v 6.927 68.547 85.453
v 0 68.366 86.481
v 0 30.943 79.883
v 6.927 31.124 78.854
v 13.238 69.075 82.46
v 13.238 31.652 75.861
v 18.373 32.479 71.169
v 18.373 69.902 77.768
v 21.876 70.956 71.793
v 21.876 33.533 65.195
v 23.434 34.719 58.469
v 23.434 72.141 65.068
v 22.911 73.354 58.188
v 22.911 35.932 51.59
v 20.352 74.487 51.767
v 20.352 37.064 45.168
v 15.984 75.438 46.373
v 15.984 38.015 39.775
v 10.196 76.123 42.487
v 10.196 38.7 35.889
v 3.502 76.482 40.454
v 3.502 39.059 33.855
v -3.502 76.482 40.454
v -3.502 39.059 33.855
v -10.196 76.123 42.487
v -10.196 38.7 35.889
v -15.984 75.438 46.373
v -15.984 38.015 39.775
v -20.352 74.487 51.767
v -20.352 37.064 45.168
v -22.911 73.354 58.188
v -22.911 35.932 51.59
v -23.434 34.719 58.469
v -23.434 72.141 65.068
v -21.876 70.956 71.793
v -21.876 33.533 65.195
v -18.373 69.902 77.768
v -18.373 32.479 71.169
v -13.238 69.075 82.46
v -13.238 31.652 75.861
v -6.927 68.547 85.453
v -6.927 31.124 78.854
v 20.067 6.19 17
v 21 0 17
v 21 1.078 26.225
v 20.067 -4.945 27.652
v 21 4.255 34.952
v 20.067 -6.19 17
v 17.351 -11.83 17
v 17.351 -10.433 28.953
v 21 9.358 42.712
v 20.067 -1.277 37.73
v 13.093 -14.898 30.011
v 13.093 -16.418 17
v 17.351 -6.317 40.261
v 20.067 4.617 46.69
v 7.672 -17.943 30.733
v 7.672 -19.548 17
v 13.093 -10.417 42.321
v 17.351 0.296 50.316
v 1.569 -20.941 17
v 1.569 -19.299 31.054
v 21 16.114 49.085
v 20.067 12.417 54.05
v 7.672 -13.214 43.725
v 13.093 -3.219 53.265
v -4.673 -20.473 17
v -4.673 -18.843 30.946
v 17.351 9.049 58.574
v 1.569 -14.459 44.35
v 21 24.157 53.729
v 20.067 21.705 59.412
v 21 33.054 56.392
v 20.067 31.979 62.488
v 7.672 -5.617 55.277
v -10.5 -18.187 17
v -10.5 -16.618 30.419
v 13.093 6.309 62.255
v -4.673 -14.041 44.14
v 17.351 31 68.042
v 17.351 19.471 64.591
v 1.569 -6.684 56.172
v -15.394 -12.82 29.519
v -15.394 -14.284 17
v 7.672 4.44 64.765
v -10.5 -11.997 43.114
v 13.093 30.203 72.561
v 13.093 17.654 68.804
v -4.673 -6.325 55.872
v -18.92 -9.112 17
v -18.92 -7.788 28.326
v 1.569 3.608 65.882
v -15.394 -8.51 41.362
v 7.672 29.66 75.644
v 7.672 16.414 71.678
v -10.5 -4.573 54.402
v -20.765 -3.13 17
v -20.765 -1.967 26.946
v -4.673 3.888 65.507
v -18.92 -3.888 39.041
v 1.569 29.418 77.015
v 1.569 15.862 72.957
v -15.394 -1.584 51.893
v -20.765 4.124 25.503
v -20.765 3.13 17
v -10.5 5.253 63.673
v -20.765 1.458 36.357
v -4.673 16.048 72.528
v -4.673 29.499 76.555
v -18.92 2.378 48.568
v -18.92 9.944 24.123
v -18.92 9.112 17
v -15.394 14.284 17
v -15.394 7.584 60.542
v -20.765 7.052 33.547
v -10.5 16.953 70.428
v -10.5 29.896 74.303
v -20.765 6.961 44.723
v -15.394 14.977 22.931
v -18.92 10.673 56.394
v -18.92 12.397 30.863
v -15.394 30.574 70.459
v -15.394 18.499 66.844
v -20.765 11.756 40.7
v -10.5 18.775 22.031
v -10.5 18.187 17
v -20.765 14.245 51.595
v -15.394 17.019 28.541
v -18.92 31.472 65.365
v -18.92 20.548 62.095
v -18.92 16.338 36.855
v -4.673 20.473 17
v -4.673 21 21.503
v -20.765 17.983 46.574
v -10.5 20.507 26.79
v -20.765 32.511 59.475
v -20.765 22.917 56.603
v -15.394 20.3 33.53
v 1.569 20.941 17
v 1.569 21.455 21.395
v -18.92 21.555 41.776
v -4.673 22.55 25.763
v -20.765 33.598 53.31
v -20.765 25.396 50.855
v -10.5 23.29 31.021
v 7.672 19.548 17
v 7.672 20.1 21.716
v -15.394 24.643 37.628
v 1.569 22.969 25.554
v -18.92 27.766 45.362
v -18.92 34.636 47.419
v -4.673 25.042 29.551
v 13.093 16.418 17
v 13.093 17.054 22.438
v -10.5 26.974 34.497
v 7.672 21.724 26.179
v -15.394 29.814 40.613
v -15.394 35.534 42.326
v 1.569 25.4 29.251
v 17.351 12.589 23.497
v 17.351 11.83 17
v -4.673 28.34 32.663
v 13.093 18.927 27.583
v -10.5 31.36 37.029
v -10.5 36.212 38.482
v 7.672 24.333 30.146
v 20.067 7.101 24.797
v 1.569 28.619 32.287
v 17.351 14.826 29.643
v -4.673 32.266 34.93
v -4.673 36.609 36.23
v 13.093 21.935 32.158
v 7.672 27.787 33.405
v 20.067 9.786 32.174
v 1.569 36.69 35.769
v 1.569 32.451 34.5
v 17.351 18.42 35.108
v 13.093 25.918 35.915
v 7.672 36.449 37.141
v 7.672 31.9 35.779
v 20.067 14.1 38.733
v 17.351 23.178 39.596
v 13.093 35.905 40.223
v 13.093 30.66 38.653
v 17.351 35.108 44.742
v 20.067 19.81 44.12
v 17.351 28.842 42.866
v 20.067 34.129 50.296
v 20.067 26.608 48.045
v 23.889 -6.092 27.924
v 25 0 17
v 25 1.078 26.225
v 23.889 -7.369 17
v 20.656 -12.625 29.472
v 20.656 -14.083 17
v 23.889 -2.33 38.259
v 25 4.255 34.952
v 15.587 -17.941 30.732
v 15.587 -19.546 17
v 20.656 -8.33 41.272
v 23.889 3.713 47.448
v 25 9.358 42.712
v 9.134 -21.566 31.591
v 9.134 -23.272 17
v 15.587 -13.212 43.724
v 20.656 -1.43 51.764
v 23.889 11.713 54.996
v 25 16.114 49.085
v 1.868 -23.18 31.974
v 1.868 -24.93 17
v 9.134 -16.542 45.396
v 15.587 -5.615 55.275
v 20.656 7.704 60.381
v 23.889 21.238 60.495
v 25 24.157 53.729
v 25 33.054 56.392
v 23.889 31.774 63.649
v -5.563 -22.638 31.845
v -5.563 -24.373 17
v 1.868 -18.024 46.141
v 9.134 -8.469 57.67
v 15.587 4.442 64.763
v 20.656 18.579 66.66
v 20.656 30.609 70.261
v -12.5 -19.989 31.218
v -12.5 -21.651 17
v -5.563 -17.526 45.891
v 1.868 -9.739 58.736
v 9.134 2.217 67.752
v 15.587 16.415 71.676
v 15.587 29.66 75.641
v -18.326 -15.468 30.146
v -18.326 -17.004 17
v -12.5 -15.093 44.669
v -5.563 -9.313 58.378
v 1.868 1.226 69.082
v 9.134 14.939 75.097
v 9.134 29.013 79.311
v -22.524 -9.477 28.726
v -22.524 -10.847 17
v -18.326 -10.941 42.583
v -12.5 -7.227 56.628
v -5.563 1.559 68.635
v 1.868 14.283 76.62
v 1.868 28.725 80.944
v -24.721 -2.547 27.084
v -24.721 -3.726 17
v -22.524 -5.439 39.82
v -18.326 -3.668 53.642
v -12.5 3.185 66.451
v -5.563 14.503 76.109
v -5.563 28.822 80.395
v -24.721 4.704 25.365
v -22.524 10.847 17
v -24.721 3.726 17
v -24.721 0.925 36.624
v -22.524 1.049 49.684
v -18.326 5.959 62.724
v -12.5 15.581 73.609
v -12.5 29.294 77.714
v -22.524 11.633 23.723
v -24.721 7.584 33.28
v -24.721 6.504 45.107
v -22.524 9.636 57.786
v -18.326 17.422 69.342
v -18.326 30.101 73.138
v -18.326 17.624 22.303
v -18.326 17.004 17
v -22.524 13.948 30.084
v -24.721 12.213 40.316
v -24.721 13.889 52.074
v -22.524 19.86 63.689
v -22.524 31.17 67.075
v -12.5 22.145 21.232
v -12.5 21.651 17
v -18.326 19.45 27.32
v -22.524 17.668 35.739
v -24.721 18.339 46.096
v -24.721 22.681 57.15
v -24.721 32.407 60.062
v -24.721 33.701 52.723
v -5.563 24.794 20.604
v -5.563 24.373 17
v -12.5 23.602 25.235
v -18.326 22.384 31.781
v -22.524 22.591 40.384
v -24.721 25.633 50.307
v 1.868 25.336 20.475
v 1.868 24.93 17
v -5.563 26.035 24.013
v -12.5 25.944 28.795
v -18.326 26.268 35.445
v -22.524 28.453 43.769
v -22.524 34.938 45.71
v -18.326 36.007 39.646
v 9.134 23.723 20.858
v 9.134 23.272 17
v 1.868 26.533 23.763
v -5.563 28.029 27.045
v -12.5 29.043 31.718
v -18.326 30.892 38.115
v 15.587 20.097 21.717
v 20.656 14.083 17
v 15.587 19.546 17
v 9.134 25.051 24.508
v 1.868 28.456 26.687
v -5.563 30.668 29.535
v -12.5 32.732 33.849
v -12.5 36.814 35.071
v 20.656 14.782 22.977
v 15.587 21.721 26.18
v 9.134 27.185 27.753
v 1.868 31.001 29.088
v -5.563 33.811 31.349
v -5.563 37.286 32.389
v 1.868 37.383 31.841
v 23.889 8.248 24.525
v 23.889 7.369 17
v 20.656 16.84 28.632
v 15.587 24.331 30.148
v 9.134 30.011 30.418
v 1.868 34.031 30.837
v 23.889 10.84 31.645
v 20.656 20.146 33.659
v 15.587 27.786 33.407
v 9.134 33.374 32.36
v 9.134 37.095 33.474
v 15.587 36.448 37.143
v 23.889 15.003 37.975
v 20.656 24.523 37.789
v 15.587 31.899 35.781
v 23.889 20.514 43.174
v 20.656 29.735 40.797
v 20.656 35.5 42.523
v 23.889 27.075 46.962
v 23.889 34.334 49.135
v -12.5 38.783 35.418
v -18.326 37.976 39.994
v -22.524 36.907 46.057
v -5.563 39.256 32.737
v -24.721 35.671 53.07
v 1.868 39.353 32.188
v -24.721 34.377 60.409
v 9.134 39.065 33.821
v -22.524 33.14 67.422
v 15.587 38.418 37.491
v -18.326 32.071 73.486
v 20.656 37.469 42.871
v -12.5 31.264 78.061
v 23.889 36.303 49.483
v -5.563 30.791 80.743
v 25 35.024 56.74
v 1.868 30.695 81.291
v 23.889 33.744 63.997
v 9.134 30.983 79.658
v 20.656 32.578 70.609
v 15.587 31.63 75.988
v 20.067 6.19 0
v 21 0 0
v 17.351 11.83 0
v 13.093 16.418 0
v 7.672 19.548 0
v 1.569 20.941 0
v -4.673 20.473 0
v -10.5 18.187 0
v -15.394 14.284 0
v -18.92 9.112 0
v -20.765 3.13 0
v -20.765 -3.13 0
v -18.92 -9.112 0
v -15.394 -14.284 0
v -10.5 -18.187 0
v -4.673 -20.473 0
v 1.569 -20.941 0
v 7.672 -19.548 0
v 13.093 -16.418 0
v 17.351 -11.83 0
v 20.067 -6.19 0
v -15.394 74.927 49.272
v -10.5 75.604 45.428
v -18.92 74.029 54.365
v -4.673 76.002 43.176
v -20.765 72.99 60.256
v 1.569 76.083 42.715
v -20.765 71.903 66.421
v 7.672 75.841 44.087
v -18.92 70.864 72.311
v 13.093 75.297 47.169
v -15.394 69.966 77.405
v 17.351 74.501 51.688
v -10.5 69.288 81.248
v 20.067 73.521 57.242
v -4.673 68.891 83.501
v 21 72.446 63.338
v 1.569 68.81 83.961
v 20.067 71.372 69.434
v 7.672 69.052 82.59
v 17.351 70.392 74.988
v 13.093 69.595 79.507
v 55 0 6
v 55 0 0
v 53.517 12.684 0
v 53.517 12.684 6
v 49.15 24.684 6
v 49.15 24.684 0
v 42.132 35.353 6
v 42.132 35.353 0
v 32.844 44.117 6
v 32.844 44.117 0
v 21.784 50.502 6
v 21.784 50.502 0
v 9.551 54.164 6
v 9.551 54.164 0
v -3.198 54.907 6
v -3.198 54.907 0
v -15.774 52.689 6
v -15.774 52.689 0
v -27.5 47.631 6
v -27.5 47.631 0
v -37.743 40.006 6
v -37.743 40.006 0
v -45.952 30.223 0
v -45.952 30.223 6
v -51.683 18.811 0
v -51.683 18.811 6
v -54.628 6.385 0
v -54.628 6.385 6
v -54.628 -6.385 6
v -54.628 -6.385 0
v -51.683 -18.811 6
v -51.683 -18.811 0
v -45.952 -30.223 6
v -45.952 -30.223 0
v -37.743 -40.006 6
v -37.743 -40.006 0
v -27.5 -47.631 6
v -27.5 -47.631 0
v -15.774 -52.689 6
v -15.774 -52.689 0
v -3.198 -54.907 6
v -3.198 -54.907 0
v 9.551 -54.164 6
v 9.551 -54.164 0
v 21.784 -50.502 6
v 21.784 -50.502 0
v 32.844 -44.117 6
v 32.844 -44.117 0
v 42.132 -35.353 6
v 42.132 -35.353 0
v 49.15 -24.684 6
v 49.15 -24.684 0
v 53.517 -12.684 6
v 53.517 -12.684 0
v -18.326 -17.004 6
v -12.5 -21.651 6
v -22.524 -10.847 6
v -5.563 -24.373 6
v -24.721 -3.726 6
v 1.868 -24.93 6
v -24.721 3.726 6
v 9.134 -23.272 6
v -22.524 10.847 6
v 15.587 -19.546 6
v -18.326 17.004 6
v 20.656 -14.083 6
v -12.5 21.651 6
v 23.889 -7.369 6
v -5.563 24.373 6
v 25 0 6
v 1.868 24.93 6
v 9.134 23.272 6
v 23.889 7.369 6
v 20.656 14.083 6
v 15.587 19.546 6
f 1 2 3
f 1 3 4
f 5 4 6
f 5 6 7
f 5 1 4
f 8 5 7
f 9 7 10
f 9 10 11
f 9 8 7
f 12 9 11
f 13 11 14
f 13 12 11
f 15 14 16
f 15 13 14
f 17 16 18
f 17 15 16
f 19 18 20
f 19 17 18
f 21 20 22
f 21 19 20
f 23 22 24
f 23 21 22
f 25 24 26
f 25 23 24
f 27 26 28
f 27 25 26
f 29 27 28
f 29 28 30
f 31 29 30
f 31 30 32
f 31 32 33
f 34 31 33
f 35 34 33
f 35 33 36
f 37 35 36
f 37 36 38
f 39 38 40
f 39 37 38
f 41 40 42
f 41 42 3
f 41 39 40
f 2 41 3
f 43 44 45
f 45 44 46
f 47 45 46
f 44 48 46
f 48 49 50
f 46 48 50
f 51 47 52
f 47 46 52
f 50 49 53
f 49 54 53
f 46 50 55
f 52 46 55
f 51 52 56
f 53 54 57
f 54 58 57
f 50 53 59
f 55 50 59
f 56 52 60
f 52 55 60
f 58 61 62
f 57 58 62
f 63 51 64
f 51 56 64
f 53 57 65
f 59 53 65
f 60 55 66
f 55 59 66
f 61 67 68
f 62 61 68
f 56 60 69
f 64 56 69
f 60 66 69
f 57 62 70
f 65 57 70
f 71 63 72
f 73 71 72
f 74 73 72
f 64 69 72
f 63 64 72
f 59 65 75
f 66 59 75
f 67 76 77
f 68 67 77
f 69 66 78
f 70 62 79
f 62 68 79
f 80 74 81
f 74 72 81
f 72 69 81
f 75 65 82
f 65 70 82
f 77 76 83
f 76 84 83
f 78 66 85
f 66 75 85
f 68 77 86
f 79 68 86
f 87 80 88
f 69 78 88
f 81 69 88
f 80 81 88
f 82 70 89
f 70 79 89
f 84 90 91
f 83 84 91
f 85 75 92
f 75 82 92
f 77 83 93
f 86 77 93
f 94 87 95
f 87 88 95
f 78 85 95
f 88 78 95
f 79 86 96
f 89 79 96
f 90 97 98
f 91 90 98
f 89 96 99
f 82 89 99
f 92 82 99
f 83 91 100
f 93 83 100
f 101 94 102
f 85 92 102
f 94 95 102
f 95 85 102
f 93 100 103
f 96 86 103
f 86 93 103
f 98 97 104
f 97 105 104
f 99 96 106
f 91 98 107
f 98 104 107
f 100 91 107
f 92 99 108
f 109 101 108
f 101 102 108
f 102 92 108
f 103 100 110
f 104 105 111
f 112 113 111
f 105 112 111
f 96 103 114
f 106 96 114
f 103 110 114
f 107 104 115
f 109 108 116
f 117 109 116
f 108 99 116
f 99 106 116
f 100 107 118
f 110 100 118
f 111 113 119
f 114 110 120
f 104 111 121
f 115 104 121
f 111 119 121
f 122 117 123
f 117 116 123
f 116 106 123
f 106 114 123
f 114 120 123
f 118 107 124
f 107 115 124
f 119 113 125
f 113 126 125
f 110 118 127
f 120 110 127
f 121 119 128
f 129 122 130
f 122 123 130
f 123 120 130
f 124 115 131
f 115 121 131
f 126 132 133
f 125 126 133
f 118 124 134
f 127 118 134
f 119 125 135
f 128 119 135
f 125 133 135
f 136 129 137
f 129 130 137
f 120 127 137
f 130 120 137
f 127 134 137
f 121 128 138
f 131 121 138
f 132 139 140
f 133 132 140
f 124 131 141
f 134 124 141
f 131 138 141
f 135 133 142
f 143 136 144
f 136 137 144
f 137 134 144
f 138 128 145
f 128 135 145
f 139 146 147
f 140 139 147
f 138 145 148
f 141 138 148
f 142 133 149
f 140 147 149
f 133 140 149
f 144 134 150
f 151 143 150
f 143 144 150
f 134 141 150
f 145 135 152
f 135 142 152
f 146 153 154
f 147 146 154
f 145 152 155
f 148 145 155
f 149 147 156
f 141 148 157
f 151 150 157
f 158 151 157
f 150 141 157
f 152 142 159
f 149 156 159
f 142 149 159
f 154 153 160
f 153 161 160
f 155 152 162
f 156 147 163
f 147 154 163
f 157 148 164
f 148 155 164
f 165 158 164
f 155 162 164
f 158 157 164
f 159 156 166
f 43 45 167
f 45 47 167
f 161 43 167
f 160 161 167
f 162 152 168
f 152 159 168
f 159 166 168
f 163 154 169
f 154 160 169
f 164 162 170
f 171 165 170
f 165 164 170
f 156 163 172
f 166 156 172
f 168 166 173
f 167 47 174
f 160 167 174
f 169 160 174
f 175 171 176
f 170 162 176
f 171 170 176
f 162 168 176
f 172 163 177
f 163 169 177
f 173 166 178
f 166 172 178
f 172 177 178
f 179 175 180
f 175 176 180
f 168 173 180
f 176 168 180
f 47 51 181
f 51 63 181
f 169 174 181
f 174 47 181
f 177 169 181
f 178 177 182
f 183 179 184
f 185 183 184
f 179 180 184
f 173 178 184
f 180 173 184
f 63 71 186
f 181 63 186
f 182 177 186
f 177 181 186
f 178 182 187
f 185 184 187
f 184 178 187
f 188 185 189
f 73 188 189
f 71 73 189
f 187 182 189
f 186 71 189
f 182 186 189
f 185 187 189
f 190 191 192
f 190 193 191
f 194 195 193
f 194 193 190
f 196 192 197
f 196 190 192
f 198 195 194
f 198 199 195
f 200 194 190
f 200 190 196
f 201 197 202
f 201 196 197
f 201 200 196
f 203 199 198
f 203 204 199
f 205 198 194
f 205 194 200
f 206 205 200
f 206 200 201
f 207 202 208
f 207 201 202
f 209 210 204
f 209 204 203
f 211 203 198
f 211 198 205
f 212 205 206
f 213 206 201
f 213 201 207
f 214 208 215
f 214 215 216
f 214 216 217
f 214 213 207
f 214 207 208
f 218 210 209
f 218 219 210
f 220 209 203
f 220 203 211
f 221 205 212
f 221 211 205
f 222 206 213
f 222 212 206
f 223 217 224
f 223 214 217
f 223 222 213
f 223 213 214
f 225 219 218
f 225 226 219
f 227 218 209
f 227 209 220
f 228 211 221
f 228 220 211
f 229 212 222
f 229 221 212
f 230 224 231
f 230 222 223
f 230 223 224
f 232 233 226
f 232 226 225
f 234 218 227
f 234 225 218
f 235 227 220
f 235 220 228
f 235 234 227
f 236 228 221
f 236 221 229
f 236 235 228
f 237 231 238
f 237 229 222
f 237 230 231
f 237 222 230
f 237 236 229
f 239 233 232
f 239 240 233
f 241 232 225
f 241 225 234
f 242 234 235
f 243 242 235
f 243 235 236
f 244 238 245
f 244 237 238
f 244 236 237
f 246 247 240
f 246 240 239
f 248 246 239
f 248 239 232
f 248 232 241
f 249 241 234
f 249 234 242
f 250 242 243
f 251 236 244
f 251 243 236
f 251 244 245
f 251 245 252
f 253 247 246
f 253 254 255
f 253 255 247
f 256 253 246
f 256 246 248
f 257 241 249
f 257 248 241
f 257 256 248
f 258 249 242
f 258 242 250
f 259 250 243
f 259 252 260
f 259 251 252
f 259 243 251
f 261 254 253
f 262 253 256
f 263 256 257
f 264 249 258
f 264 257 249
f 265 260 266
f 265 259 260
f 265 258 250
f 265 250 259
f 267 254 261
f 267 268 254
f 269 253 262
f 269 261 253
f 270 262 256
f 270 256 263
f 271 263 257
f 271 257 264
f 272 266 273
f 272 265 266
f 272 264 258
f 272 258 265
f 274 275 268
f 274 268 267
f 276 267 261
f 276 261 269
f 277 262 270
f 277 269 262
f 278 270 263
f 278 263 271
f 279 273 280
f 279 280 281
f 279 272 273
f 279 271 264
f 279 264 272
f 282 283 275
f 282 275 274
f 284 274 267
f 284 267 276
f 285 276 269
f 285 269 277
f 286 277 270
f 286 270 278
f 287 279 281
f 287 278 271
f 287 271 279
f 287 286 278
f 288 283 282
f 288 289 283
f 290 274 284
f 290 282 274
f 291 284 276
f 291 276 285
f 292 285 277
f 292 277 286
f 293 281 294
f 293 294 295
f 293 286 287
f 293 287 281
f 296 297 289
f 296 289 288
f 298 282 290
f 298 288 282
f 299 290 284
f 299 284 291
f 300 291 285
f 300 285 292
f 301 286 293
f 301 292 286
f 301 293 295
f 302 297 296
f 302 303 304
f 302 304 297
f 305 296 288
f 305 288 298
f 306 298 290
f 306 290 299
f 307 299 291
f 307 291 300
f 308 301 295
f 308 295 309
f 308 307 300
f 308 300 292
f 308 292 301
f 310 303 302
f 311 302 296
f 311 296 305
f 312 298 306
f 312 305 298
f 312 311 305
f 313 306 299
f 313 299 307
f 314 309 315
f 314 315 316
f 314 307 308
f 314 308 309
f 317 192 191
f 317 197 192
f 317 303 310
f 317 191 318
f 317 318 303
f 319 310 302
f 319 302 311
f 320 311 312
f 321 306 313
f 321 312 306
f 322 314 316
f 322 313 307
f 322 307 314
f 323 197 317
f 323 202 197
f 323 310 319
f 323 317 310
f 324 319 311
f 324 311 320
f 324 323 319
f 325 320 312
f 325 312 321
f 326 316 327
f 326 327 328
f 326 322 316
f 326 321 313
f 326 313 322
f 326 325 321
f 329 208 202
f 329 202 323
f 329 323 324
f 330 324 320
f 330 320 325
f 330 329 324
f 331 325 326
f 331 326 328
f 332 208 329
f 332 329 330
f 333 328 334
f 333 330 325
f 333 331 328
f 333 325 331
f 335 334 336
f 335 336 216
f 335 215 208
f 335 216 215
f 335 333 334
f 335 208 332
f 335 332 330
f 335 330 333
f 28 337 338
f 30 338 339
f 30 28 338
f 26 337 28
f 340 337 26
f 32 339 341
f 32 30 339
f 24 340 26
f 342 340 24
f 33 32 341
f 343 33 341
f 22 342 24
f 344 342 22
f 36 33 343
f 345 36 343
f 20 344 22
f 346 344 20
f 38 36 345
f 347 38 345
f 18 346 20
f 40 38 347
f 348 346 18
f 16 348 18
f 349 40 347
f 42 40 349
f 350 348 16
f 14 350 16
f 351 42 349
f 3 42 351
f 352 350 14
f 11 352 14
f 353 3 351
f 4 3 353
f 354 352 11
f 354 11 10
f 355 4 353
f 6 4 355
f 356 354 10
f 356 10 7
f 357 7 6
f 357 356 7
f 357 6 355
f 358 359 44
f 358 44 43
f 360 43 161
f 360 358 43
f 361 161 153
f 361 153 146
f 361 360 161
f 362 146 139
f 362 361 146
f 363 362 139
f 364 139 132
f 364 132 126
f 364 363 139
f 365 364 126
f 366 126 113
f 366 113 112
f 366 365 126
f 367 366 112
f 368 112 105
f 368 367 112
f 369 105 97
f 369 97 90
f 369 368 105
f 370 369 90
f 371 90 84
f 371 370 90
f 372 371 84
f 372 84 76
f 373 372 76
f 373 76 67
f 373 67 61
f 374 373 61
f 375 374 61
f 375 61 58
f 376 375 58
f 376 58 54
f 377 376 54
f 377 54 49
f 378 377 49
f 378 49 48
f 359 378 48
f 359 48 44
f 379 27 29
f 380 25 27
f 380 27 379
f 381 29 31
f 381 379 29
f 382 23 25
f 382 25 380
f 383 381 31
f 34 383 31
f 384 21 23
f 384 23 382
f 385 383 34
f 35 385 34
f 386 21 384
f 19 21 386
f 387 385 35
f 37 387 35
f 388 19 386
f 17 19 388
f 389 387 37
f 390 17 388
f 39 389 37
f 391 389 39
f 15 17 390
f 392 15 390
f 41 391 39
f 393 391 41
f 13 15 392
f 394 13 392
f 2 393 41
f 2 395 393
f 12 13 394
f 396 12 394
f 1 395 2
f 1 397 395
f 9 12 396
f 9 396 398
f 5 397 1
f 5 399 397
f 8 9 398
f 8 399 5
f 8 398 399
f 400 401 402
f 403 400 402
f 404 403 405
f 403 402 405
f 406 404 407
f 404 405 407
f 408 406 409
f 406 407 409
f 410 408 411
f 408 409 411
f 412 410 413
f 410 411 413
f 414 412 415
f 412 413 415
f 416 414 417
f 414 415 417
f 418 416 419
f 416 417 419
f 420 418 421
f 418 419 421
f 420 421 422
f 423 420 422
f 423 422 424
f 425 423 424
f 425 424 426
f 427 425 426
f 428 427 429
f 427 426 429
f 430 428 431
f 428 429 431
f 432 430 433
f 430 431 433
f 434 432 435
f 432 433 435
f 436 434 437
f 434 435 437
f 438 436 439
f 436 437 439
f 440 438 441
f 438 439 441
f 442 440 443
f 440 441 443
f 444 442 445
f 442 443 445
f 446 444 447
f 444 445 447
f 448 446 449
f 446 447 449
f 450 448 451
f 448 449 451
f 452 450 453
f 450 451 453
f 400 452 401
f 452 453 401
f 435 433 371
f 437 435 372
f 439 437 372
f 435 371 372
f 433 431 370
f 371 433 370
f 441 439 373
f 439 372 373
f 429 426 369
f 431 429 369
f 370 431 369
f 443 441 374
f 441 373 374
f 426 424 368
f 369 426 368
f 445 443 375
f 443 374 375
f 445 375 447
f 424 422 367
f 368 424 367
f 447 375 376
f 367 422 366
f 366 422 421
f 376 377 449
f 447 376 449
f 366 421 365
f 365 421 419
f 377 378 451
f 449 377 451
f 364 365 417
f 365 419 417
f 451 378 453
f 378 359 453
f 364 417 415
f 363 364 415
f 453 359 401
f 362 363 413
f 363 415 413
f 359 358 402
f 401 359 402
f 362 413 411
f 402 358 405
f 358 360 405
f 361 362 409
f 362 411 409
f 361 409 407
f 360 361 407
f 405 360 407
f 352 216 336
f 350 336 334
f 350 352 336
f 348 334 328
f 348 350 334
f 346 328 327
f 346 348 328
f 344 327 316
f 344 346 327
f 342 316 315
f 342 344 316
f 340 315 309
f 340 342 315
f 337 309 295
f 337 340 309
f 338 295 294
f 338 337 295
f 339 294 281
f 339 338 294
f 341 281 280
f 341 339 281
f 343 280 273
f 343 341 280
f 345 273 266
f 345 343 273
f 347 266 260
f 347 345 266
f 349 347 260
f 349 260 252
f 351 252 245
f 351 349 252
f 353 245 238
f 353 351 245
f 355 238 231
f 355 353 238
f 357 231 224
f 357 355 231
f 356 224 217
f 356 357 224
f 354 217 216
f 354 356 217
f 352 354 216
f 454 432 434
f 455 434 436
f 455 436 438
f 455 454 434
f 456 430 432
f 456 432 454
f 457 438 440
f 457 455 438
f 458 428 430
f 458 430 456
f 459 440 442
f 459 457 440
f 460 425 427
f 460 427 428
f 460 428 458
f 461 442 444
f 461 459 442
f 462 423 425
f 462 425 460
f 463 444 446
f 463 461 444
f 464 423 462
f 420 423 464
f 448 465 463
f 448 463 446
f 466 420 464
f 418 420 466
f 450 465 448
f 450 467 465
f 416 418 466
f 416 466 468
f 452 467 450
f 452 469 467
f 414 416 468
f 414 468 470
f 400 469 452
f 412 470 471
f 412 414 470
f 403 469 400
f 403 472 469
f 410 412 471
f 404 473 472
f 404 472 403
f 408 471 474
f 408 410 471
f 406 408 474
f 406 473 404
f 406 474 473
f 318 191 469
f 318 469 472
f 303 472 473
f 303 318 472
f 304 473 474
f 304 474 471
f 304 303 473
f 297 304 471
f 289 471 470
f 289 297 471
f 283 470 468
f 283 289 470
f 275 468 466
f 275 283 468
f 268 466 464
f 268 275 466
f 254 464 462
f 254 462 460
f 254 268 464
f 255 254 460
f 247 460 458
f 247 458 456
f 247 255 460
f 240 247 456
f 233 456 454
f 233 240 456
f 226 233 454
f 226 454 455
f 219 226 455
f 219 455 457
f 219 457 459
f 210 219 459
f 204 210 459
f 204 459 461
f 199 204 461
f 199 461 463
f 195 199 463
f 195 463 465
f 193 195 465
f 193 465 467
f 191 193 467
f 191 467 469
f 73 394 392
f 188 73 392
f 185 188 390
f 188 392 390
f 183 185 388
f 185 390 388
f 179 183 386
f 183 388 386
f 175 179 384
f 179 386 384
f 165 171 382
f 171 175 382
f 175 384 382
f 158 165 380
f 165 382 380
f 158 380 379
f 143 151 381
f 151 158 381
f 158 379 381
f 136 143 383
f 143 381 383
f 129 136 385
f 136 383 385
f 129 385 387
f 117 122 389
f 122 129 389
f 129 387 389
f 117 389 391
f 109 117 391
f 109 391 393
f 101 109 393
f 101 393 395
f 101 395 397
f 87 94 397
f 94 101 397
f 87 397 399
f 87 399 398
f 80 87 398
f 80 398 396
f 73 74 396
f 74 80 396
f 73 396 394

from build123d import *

# Parameters (mm, degrees)
ESQUISSE1_R             = 55
ESQUISSE1_R_2           = 25
BOSS_EXTRU_1_DEPTH      = 6
BOSS_EXTRU_2_DEPTH      = 1
BOSS_EXTRU_2_DEPTH_BACK = 6
ESQUISSE2_R             = 25
ESQUISSE2_R_2           = 21
ESQUISSE4_R             = 25
ESQUISSE4_R_2           = 21
ESQUISSE8_R             = 25
ESQUISSE8_R_2           = 23.5
ENL_V_MAT_EXTRU_1_DEPTH = 38


with BuildPart() as part:
    # Esquisse1 → Boss.-Extru.1 (new body)
    with BuildSketch(Plane.XY):
        Circle(ESQUISSE1_R)
        Circle(ESQUISSE1_R_2, mode=Mode.SUBTRACT)
    extrude(amount=BOSS_EXTRU_1_DEPTH)

    # Esquisse2 → Boss.-Extru.2 (add, two sides: drawn at the far end of the back side and taken through both)
    with BuildSketch(Plane.XY.offset(6).offset(-BOSS_EXTRU_2_DEPTH_BACK)):
        Circle(ESQUISSE2_R)
        Circle(ESQUISSE2_R_2, mode=Mode.SUBTRACT)
    extrude(amount=BOSS_EXTRU_2_DEPTH + BOSS_EXTRU_2_DEPTH_BACK)

    # Balayage5: sweep along a path in Esquisse3
    with BuildLine(Plane(origin=(0, 0, 0), x_dir=(0, 0, -1), z_dir=(1, 0, 0))) as balayage5_path:
        Line((-7, 0), (-17, 0))
        ThreePointArc((-17, 0), (-42.711504387, 9.358222275), (-56.39231012, 33.054072893))
        Line((-56.39231012, 33.054072893), (-63.338237227, 72.446383014))
    # Esquisse4 → Balayage5 (sweep)
    with BuildSketch(Plane.XY.offset(7)):
        Circle(ESQUISSE4_R)
        Circle(ESQUISSE4_R_2, mode=Mode.SUBTRACT)
    sweep(path=balayage5_path.line)

    # Esquisse8 → Enlèv. mat.-Extru.1 (cut)
    with BuildSketch(Plane(origin=(0, 81.093333754, 14.298942697), x_dir=(1, 0, 0), z_dir=(0, 0.9848077530122087, 0.17364817766692714))):
        with Locations(Location((0, -49.795804695, 0), (0, 0, 270))):
            Circle(ESQUISSE8_R)
        with Locations(Location((0, -49.795804695, 0), (0, 0, 270))):
            Circle(ESQUISSE8_R_2, mode=Mode.SUBTRACT)
    extrude(amount=-ENL_V_MAT_EXTRU_1_DEPTH, mode=Mode.SUBTRACT)


solid = part.part
